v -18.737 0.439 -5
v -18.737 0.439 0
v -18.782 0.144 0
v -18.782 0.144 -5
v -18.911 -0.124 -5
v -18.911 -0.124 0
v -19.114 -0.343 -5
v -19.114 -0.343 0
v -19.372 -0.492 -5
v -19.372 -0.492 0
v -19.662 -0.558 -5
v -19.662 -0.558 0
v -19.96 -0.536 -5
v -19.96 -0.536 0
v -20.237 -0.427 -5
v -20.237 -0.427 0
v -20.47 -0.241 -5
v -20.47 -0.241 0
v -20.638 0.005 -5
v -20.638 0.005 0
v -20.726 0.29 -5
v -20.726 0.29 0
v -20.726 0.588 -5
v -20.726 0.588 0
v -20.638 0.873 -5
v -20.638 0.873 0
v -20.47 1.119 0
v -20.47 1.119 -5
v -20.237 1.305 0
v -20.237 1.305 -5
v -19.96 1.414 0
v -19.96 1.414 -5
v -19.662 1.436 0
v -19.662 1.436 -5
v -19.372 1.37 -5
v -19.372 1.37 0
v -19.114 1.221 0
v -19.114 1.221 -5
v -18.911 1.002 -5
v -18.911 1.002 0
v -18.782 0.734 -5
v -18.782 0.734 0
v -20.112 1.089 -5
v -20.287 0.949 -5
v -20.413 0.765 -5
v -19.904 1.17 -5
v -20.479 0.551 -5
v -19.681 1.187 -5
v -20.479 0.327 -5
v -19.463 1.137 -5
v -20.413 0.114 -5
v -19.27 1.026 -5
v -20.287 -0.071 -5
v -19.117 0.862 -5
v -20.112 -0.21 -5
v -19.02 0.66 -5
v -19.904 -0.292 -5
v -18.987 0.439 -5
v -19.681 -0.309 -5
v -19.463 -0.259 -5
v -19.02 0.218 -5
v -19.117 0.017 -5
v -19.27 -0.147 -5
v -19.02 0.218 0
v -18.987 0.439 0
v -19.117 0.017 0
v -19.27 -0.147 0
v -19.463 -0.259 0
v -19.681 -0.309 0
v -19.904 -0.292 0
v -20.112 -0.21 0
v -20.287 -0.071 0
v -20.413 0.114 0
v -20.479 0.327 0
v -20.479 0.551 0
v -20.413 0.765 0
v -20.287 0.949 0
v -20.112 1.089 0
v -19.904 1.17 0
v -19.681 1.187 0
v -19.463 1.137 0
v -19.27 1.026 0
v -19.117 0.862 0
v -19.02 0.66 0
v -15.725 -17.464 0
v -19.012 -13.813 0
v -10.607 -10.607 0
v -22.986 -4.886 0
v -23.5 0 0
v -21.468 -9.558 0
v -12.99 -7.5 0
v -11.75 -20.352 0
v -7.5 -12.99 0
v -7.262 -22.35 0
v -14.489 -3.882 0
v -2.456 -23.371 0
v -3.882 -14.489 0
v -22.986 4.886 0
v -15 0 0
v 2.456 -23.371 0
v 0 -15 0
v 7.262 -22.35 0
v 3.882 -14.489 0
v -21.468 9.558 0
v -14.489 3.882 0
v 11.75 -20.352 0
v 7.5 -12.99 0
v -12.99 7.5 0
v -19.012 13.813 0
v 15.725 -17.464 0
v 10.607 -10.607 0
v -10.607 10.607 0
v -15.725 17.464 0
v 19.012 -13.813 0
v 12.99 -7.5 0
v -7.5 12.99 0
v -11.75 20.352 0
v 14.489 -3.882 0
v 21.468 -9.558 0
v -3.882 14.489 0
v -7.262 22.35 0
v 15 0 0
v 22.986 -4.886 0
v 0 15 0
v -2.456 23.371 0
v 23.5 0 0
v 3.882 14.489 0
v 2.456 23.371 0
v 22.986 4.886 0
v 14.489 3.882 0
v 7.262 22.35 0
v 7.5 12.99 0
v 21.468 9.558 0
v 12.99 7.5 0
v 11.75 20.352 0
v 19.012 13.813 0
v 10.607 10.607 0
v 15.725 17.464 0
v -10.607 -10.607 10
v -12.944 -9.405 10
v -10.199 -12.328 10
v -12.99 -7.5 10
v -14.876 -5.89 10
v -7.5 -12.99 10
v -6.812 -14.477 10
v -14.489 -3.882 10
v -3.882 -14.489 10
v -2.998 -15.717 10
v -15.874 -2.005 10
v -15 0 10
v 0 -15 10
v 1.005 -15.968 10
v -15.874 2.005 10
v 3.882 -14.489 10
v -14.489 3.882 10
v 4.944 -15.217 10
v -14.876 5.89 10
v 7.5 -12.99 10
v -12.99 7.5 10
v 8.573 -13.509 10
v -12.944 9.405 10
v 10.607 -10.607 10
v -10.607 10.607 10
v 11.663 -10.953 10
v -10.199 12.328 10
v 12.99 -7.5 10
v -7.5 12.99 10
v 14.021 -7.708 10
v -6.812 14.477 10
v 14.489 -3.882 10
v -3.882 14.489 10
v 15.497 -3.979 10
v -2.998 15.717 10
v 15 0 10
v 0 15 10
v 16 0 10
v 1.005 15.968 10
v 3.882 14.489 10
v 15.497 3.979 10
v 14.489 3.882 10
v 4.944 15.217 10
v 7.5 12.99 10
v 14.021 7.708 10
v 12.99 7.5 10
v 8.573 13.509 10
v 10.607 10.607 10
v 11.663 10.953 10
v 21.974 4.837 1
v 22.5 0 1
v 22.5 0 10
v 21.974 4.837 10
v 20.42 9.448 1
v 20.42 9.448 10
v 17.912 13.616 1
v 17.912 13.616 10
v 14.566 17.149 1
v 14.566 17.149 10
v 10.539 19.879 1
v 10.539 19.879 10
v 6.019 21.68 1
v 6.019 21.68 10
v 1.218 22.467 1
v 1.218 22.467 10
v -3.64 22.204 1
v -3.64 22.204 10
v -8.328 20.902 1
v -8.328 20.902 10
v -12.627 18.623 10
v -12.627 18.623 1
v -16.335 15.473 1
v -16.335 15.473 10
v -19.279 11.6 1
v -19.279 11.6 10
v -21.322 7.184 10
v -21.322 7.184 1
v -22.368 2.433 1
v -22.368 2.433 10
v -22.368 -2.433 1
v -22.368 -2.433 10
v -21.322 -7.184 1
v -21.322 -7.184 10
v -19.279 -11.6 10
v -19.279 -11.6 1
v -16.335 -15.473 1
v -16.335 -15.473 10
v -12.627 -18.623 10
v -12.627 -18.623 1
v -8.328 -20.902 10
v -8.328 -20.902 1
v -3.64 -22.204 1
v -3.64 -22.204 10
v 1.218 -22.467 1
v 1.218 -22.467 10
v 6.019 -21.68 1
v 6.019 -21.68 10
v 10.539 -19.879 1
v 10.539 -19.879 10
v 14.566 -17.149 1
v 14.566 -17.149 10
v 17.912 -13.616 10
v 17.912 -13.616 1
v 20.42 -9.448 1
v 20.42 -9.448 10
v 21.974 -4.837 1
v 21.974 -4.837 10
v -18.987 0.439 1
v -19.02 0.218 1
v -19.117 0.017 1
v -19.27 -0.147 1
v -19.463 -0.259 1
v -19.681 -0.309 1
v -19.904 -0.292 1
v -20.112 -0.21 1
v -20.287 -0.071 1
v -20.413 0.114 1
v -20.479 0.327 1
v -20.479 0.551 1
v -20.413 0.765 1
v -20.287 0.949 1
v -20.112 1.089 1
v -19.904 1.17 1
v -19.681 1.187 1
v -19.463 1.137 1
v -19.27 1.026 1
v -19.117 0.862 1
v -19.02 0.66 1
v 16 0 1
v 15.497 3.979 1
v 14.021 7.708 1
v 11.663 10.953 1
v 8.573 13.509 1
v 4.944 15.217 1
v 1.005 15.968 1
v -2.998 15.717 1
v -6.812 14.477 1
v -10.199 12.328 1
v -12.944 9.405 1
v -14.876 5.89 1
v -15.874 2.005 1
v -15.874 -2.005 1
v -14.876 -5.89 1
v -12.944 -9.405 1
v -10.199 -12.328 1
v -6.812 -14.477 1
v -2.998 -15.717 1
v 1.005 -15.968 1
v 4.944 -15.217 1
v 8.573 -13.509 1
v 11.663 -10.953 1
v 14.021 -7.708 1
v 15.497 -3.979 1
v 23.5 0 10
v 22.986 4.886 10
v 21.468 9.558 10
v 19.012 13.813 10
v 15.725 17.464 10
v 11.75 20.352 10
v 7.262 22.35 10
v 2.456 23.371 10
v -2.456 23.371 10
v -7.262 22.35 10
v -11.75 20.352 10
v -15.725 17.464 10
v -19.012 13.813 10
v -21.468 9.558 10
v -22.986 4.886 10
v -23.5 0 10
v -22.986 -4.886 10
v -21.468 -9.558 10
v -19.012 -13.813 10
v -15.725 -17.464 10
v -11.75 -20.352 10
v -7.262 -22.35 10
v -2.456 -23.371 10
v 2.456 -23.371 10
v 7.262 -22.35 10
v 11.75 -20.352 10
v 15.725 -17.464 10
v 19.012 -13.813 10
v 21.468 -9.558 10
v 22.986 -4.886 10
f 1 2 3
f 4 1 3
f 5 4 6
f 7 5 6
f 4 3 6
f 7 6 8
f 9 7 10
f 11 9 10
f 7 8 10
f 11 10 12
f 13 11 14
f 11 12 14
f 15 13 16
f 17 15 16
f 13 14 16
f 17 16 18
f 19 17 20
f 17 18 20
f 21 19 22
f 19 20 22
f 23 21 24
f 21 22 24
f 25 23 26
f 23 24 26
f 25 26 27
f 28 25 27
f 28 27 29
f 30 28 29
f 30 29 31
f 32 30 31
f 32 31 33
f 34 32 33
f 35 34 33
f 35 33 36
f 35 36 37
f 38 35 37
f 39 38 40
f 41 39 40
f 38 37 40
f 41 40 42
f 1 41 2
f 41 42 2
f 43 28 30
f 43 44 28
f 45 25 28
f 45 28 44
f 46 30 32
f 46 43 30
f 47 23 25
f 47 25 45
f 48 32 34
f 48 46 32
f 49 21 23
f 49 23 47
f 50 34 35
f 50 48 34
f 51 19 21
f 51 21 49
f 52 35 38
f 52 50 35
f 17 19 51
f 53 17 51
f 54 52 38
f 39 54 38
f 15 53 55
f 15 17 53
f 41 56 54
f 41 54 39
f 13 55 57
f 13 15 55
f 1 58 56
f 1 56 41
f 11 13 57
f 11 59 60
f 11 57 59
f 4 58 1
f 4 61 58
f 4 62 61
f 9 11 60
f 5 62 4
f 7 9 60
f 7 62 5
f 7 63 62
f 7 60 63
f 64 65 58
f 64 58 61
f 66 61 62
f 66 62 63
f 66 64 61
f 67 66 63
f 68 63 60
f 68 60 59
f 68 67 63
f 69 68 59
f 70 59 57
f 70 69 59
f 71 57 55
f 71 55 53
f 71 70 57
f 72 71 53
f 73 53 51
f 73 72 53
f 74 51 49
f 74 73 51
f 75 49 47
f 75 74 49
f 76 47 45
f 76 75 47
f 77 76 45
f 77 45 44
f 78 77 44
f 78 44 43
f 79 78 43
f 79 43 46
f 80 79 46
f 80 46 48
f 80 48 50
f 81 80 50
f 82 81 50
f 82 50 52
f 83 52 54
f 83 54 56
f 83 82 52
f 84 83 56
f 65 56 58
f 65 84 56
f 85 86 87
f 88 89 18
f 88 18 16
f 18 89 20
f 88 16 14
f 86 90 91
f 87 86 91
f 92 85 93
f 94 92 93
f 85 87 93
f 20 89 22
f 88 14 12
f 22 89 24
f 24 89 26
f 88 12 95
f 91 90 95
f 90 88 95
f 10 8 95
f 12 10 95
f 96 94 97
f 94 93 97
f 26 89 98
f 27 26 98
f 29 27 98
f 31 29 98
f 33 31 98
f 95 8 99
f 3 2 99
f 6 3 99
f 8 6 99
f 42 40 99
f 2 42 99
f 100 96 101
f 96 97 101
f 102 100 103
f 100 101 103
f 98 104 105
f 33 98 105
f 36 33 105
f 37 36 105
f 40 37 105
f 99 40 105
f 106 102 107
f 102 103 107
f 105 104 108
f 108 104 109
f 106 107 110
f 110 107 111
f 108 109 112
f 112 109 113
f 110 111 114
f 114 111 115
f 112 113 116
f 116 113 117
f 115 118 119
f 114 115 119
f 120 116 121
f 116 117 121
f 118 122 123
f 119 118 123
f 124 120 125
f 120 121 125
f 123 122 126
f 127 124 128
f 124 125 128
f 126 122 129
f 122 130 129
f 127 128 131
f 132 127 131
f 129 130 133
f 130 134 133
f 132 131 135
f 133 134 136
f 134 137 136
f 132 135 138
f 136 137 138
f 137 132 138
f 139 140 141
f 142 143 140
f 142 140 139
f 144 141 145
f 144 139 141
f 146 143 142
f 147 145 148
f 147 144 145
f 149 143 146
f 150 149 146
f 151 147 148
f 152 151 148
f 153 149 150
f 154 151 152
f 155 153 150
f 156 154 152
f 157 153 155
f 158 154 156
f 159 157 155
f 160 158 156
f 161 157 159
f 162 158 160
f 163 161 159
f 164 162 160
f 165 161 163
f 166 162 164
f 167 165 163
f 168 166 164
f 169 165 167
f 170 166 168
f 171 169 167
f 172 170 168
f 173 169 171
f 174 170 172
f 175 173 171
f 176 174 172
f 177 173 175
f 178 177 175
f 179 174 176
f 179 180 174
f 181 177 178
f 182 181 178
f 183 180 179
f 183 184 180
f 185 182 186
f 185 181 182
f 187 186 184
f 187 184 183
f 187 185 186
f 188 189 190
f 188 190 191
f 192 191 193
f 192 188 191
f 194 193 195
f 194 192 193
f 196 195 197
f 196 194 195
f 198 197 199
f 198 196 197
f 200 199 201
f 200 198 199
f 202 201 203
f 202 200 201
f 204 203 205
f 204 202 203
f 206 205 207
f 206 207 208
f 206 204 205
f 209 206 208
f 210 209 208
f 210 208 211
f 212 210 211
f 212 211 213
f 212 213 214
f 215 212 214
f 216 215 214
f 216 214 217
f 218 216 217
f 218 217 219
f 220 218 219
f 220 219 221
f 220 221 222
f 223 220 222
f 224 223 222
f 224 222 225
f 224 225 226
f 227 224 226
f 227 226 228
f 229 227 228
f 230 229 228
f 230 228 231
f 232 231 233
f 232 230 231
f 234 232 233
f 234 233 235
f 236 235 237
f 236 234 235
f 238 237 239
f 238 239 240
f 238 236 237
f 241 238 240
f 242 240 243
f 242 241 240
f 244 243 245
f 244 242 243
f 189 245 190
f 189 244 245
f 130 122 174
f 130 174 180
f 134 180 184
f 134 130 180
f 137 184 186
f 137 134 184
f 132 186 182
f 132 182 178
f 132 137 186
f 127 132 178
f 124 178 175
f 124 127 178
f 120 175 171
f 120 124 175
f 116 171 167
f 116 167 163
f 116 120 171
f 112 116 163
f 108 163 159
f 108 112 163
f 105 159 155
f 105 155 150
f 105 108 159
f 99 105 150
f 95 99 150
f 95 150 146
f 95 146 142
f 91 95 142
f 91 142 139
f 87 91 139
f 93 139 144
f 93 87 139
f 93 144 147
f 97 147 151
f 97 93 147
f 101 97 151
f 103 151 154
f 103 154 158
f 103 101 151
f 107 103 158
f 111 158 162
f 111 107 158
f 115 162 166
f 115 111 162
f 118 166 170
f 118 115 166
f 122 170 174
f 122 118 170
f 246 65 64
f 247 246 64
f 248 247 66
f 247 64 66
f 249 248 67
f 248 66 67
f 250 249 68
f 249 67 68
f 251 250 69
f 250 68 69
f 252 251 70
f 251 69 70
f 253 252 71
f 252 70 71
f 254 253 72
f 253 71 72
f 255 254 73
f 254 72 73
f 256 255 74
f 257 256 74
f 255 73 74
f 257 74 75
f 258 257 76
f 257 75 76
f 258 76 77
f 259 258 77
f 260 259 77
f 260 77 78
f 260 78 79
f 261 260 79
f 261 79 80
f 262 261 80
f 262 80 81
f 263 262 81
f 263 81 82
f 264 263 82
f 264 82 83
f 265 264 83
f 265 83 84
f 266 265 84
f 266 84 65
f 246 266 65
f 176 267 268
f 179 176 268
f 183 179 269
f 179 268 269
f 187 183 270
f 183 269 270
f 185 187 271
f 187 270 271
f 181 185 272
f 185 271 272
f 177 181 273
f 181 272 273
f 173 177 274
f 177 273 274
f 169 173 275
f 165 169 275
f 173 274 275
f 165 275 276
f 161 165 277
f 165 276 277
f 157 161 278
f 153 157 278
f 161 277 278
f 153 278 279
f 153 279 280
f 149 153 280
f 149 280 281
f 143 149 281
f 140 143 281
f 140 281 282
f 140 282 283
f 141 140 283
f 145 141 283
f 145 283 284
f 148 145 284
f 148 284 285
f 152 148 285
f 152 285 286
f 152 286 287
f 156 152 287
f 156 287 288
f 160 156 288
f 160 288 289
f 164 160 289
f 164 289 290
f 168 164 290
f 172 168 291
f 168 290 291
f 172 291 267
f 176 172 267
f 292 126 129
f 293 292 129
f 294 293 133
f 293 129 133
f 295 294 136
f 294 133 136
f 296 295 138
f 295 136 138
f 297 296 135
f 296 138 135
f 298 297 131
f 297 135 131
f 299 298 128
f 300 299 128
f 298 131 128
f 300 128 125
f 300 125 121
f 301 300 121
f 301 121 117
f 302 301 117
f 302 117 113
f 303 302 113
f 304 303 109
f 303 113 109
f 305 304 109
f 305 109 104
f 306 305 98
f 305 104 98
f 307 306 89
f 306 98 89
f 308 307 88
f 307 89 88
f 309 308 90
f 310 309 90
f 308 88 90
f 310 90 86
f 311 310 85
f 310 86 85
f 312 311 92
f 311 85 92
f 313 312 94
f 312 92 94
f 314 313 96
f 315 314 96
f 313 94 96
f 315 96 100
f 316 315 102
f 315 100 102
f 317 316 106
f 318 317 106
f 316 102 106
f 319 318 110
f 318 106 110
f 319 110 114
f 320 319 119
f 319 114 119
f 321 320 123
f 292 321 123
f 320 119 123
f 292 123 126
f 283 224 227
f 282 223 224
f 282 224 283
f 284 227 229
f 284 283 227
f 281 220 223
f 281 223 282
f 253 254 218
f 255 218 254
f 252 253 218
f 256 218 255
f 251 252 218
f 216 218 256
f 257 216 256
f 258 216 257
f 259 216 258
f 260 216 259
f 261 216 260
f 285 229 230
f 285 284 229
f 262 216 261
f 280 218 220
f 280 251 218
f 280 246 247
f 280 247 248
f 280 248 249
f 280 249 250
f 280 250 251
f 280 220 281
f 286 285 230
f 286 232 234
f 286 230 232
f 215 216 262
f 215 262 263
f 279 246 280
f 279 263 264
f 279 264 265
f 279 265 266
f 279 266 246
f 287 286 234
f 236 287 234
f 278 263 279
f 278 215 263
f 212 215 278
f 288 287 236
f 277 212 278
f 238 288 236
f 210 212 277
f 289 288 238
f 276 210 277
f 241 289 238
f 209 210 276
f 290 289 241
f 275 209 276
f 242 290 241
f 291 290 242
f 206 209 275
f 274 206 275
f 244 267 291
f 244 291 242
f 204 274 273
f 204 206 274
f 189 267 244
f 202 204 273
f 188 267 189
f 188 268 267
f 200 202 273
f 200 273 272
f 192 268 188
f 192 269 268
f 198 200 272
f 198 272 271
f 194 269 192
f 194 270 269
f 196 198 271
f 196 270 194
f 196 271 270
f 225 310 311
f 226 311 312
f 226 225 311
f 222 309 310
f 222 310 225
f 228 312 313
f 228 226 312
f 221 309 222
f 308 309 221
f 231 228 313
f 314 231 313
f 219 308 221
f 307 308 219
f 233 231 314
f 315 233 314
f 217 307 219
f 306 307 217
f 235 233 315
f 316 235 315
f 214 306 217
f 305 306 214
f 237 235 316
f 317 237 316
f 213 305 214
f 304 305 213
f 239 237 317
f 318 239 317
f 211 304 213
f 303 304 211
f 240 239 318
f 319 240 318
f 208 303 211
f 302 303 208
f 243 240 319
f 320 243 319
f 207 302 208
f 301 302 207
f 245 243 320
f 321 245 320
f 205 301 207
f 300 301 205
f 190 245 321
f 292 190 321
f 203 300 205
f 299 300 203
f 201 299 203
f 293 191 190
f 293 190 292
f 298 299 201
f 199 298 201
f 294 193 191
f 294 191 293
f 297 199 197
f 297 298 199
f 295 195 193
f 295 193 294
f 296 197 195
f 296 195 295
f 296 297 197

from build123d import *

# Parameters (mm, degrees)
F0_R     = 23.5
F0_R_2   = 15
F1_DEPTH = 10
F2_T     = -1
F3_R     = 1
F3_R_2   = 0.75
F4_DEPTH = 5
F5_R     = 0.75
F6_DEPTH = 1.1


with BuildPart() as f1:
    # F0 (on Top) → F1 (new body)
    with BuildSketch(Plane.XY):
        Circle(F0_R)
        Circle(F0_R_2, mode=Mode.SUBTRACT)
    extrude(amount=F1_DEPTH)

    # F2
    f2_openings = [f1.faces().sort_by_distance(p)[0] for p in [
        (-22.83532, 0, 10),
    ]]
    offset(amount=F2_T, openings=f2_openings)

    # F3 (on face) → F4 (join)
    with BuildSketch(Plane(origin=(0, 0, 0), x_dir=(1, 0, 0), z_dir=(0, 0, -1))):
        with Locations((-19.737165, -0.43914)):
            Circle(F3_R)
        with Locations((-19.737165, -0.43914)):
            Circle(F3_R_2, mode=Mode.SUBTRACT)
    extrude(amount=F4_DEPTH)

    # F5 (on face) → F6 (cut)
    with BuildSketch(Plane(origin=(0, 0, 0), x_dir=(1, 0, 0), z_dir=(0, 0, -1))):
        with Locations((-19.737165, -0.43914)):
            Circle(F5_R)
    extrude(amount=-F6_DEPTH, mode=Mode.SUBTRACT)


solid = f1.part
